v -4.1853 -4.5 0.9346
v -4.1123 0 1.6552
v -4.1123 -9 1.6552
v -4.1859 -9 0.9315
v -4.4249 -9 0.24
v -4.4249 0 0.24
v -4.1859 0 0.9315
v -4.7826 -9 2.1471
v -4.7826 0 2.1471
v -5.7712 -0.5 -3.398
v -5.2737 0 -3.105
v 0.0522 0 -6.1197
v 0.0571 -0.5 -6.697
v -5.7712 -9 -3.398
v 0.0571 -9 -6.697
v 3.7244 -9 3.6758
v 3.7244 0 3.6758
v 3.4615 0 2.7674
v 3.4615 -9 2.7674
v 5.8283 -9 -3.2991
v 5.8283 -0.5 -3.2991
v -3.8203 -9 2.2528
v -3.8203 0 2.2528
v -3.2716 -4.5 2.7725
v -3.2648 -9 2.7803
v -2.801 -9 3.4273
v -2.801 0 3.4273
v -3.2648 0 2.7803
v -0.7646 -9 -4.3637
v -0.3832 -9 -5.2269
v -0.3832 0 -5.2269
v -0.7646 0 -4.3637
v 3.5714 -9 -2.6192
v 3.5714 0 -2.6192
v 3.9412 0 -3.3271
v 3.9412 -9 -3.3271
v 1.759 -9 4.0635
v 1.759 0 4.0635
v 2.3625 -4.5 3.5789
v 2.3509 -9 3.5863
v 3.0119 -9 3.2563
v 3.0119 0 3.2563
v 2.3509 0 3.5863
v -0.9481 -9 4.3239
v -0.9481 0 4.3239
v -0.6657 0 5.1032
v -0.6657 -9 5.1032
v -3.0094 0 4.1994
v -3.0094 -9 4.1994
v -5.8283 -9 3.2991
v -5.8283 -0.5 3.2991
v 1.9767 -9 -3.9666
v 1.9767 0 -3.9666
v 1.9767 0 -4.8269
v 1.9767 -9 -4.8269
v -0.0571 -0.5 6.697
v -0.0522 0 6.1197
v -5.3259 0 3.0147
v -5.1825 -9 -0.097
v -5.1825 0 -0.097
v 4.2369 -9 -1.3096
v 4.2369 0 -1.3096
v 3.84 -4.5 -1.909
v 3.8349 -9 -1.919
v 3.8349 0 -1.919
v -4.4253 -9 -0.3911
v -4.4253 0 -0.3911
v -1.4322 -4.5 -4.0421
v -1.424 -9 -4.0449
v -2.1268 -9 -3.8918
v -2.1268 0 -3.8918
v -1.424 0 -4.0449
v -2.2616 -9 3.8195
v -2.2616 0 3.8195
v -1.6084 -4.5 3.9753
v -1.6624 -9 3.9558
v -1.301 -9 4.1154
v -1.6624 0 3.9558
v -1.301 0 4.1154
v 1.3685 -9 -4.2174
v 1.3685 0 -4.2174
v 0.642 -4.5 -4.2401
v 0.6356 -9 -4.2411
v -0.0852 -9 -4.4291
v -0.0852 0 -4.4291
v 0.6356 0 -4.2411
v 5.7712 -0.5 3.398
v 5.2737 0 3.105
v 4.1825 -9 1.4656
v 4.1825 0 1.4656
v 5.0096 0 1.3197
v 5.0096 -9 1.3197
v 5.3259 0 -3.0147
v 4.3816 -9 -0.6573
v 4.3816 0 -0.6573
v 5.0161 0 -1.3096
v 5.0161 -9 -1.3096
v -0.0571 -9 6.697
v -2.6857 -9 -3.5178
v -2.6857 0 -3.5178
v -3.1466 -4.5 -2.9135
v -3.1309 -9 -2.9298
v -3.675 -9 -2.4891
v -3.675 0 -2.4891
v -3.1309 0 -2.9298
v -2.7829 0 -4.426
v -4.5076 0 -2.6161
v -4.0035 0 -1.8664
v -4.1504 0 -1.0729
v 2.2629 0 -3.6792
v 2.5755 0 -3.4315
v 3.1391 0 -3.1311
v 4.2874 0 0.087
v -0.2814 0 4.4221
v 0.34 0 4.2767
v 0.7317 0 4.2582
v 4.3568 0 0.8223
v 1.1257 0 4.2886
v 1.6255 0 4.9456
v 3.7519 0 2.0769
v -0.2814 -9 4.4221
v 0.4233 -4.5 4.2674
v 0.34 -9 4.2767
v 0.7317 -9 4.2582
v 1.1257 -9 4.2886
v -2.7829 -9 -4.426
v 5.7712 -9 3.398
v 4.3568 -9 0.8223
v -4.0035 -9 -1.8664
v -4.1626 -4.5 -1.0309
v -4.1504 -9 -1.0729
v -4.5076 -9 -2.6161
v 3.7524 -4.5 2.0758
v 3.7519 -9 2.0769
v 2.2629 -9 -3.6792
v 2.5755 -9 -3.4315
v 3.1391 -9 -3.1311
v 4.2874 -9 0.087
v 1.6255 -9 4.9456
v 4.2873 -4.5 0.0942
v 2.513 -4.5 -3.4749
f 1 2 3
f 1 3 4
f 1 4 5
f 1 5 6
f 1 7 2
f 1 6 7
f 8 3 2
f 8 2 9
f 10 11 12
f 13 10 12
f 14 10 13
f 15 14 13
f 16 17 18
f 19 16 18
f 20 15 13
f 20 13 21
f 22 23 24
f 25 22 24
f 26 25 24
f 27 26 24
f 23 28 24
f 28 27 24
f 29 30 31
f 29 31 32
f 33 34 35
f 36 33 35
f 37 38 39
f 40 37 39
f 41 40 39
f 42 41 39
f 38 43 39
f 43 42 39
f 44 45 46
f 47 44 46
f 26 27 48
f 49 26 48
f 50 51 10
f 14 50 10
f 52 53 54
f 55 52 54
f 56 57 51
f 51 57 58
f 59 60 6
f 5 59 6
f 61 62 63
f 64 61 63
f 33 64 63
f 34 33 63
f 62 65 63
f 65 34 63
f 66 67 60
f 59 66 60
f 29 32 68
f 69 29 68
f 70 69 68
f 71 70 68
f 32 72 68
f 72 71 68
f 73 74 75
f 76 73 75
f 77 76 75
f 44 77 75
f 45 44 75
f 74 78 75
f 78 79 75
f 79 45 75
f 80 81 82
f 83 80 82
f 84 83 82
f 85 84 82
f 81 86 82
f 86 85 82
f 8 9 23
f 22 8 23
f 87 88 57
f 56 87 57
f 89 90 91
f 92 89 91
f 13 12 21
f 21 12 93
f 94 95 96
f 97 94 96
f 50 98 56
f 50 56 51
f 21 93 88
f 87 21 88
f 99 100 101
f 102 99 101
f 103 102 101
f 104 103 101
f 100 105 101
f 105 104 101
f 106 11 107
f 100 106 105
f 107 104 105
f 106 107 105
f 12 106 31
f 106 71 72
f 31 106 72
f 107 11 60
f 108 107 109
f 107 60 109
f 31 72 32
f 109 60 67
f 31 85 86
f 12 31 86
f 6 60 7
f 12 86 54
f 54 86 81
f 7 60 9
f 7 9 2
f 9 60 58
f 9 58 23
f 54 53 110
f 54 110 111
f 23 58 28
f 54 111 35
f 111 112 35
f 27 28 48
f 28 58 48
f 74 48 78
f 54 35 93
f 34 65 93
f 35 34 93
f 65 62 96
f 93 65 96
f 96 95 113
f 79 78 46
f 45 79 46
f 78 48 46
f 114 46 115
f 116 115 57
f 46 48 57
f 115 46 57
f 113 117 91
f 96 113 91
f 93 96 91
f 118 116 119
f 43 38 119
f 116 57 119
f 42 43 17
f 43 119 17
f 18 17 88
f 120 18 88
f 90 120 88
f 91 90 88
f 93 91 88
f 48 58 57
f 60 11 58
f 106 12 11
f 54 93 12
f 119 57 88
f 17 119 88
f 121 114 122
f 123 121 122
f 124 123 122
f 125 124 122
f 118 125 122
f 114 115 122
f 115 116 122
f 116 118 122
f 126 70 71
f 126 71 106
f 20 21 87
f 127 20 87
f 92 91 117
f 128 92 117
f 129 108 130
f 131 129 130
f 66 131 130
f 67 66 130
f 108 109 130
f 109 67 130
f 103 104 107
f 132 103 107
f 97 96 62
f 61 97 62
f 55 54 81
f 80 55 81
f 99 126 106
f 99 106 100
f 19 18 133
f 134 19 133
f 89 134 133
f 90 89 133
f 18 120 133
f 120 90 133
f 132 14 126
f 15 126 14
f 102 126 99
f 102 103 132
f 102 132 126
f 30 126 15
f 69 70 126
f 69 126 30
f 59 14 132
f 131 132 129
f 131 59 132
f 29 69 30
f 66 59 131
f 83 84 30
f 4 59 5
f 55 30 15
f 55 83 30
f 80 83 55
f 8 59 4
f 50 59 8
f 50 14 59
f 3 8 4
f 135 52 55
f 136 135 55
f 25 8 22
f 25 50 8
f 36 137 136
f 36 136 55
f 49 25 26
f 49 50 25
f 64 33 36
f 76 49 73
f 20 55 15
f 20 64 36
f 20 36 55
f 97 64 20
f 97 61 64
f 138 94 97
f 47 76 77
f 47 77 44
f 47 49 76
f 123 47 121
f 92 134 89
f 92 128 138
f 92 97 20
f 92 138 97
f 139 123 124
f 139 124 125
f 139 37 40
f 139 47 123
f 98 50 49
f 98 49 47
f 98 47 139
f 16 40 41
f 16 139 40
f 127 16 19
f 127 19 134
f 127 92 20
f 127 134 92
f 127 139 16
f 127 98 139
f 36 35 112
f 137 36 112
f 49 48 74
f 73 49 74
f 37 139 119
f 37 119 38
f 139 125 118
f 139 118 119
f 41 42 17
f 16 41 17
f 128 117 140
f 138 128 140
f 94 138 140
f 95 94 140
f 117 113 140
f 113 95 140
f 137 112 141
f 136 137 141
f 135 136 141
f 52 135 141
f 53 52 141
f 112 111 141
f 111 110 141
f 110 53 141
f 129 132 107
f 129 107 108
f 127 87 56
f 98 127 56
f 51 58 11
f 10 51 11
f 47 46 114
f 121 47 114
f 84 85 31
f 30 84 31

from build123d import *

# Parameters (mm, degrees)
F1_DEPTH = 9
F2_SIZE  = 0.5


with BuildPart() as f1:
    # F0 (on Front) → F1 (new body)
    with BuildSketch(Plane.XZ):
        Polygon((5.771239479, 3.3979594185), (-0.057099438, 6.6970197094), (-5.8283389169, 3.2990602908), (-5.771239479, -3.3979594185), (0.057099438, -6.6970197094), (5.8283389169, -3.2990602908), align=None)
        with BuildLine():
            add(Edge.make_bspline(
                [(-4.1123446832, 1.6552429256), (-4.1174787775, 1.411329486), (-4.1500733637, 0.925537621), (-4.325246506, 0.4676303043), (-4.4248853183, 0.2399919724)],
                knots=[0.1654680305, 0.1654680305, 0.1654680305, 0.1654680305, 0.4981922517, 0.8338193254, 0.8338193254, 0.8338193254, 0.8338193254], degree=3))
            Line((-4.1123446832, 1.6552429256), (-4.7825924335, 2.147149279))
            Line((-4.7825924335, 2.147149279), (-3.8203382814, 2.2527694981))
            add(Edge.make_bspline(
                [(-3.8203382814, 2.2527694981), (-3.6264101242, 2.412883771), (-3.2450169042, 2.7547368534), (-2.9460164758, 3.1949170496), (-2.8009872015, 3.4272985006)],
                knots=[0.1618034438, 0.1618034438, 0.1618034438, 0.1618034438, 0.4904688292, 0.8308115665, 0.8308115665, 0.8308115665, 0.8308115665], degree=3))
            Line((-2.8009872015, 3.4272985006), (-3.009358343, 4.1993869056))
            Line((-3.009358343, 4.1993869056), (-2.2615699073, 3.8194522076))
            add(Edge.make_bspline(
                [(-2.2615699073, 3.8194522076), (-2.0403463186, 3.8514725128), (-1.5889015237, 3.9418806441), (-1.1642693862, 4.1852821428), (-0.9481149286, 4.3239350164)],
                knots=[0.1595627595, 0.1595627595, 0.1595627595, 0.1595627595, 0.4847715969, 0.8295051617, 0.8295051617, 0.8295051617, 0.8295051617], degree=3))
            Line((-0.9481149286, 4.3239350164), (-0.6656752564, 5.1032288397))
            Line((-0.6656752564, 5.1032288397), (-0.2814478202, 4.4221181091))
            add(Edge.make_bspline(
                [(-0.2814478202, 4.4221181091), (-0.0475204769, 4.3494489431), (0.4180814718, 4.2302011817), (0.8906361121, 4.261042496), (1.1257445194, 4.2885900376)],
                knots=[0.1667778488, 0.1667778488, 0.1667778488, 0.1667778488, 0.5036930477, 0.8356937369, 0.8356937369, 0.8356937369, 0.8356937369], degree=3))
            Line((1.1257445194, 4.2885900376), (1.6254587255, 4.9455818646))
            Line((1.6254587255, 4.9455818646), (1.7590165896, 4.0634635146))
            add(Edge.make_bspline(
                [(1.7590165896, 4.0634635146), (1.9516755707, 3.8838712943), (2.3398013561, 3.5520856406), (2.7878134674, 3.3473103351), (3.0118703972, 3.2562815915)],
                knots=[0.1686500373, 0.1686500373, 0.1686500373, 0.1686500373, 0.5090727407, 0.8370846142, 0.8370846142, 0.8370846142, 0.8370846142], degree=3))
            Line((3.0118703972, 3.2562815915), (3.7244220819, 3.6758139496))
            Line((3.7244220819, 3.6758139496), (3.4614664388, 2.767384373))
            add(Edge.make_bspline(
                [(3.4614664388, 2.767384373), (3.5417461863, 2.5274125007), (3.7219735139, 2.0595083937), (4.022538142, 1.6596363104), (4.182542038, 1.4656475082)],
                knots=[0.1652961564, 0.1652961564, 0.1652961564, 0.1652961564, 0.5005752218, 0.8347778047, 0.8347778047, 0.8347778047, 0.8347778047], degree=3))
            Line((4.182542038, 1.4656475082), (5.0096104241, 1.3197048267))
            Line((5.0096104241, 1.3197048267), (4.3567863345, 0.8223262081))
            add(Edge.make_bspline(
                [(4.3567863345, 0.8223262081), (4.3146279079, 0.580695946), (4.2520460753, 0.0913297677), (4.3308041169, -0.4057707033), (4.3815805084, -0.6572954773)],
                knots=[0.1639086104, 0.1639086104, 0.1639086104, 0.1639086104, 0.4951390174, 0.8328828627, 0.8328828627, 0.8328828627, 0.8328828627], degree=3))
            Line((4.3815805084, -0.6572954773), (5.016087005, -1.3095750167))
            Line((5.016087005, -1.3095750167), (4.2368834794, -1.3095750167))
            add(Edge.make_bspline(
                [(4.2368834794, -1.3095750167), (4.0886648144, -1.4989078417), (3.8067923335, -1.8960921072), (3.6441596385, -2.3714968484), (3.5713788507, -2.6192273034)],
                knots=[0.1632176788, 0.1632176788, 0.1632176788, 0.1632176788, 0.4922900583, 0.8315491328, 0.8315491328, 0.8315491328, 0.8315491328], degree=3))
            Line((3.5713788507, -2.6192273034), (3.9412326893, -3.3271131047))
            Line((3.9412326893, -3.3271131047), (3.139059723, -3.1311374767))
            add(Edge.make_bspline(
                [(3.139059723, -3.1311374767), (2.9192288697, -3.2288079799), (2.4905584361, -3.445089303), (2.1442178415, -3.7858182118), (1.9766546194, -3.9665931306)],
                knots=[0.1642840141, 0.1642840141, 0.1642840141, 0.1642840141, 0.4971634677, 0.8332358166, 0.8332358166, 0.8332358166, 0.8332358166], degree=3))
            Line((1.9766546194, -3.9665931306), (1.9766546194, -4.8269105444))
            Line((1.9766546194, -4.8269105444), (1.3685185895, -4.217423559))
            add(Edge.make_bspline(
                [(1.3685185895, -4.217423559), (1.1249538803, -4.2058360658), (0.6350996935, -4.2053944064), (0.1557393345, -4.3463754391), (-0.0851970183, -4.4290614189)],
                knots=[0.1638104421, 0.1638104421, 0.1638104421, 0.1638104421, 0.49509585, 0.8323336044, 0.8323336044, 0.8323336044, 0.8323336044], degree=3))
            Line((-0.0851970183, -4.4290614189), (-0.3831844502, -5.2268570406))
            Line((-0.3831844502, -5.2268570406), (-0.7645896939, -4.3637078397))
            add(Edge.make_bspline(
                [(-0.7645896939, -4.3637078397), (-0.9818357622, -4.236433015), (-1.4173063734, -4.0082254227), (-1.8904356885, -3.9230966079), (-2.1267794111, -3.8917799757)],
                knots=[0.1672173978, 0.1672173978, 0.1672173978, 0.1672173978, 0.5057100699, 0.8361046679, 0.8361046679, 0.8361046679, 0.8361046679], degree=3))
            Line((-2.1267794111, -3.8917799757), (-2.7828615346, -4.4259875182))
            Line((-2.7828615346, -4.4259875182), (-2.6856618063, -3.5177582831))
            add(Edge.make_bspline(
                [(-2.6856618063, -3.5177582831), (-2.8267960426, -3.2977068408), (-3.1148828244, -2.8927455355), (-3.4878769032, -2.6141661912), (-3.675020495, -2.4890794933)],
                knots=[0.1709926301, 0.1709926301, 0.1709926301, 0.1709926301, 0.5162755372, 0.8403006819, 0.8403006819, 0.8403006819, 0.8403006819], degree=3))
            Line((-3.675020495, -2.4890794933), (-4.5076293021, -2.6161145871))
            Line((-4.5076293021, -2.6161145871), (-4.0035495268, -1.8664072081))
            add(Edge.make_bspline(
                [(-4.0035495268, -1.8664072081), (-4.0395064471, -1.5730373445), (-4.1268579509, -1.0348551439), (-4.3242225424, -0.5925714681), (-4.4253310095, -0.391094776)],
                knots=[0.1759644155, 0.1759644155, 0.1759644155, 0.1759644155, 0.5294954292, 0.8448108675, 0.8448108675, 0.8448108675, 0.8448108675], degree=3))
            Line((-4.4253310095, -0.391094776), (-5.1825380257, -0.0970175081))
            Line((-5.1825380257, -0.0970175081), (-4.4248853183, 0.2399919724))
        make_face(mode=Mode.SUBTRACT)
    extrude(amount=F1_DEPTH)

    # F2
    f2_edges = [f1.edges().sort_by_distance(p)[0] for p in [
        (-2.942719, 0, 4.99804),
        (-5.799789, 0, -0.04945),
        (-2.85707, 0, -5.04749),
        (2.942719, 0, -4.99804),
        (5.799789, 0, 0.04945),
        (2.85707, 0, 5.04749),
    ]]
    chamfer(f2_edges, length=F2_SIZE)


solid = f1.part
